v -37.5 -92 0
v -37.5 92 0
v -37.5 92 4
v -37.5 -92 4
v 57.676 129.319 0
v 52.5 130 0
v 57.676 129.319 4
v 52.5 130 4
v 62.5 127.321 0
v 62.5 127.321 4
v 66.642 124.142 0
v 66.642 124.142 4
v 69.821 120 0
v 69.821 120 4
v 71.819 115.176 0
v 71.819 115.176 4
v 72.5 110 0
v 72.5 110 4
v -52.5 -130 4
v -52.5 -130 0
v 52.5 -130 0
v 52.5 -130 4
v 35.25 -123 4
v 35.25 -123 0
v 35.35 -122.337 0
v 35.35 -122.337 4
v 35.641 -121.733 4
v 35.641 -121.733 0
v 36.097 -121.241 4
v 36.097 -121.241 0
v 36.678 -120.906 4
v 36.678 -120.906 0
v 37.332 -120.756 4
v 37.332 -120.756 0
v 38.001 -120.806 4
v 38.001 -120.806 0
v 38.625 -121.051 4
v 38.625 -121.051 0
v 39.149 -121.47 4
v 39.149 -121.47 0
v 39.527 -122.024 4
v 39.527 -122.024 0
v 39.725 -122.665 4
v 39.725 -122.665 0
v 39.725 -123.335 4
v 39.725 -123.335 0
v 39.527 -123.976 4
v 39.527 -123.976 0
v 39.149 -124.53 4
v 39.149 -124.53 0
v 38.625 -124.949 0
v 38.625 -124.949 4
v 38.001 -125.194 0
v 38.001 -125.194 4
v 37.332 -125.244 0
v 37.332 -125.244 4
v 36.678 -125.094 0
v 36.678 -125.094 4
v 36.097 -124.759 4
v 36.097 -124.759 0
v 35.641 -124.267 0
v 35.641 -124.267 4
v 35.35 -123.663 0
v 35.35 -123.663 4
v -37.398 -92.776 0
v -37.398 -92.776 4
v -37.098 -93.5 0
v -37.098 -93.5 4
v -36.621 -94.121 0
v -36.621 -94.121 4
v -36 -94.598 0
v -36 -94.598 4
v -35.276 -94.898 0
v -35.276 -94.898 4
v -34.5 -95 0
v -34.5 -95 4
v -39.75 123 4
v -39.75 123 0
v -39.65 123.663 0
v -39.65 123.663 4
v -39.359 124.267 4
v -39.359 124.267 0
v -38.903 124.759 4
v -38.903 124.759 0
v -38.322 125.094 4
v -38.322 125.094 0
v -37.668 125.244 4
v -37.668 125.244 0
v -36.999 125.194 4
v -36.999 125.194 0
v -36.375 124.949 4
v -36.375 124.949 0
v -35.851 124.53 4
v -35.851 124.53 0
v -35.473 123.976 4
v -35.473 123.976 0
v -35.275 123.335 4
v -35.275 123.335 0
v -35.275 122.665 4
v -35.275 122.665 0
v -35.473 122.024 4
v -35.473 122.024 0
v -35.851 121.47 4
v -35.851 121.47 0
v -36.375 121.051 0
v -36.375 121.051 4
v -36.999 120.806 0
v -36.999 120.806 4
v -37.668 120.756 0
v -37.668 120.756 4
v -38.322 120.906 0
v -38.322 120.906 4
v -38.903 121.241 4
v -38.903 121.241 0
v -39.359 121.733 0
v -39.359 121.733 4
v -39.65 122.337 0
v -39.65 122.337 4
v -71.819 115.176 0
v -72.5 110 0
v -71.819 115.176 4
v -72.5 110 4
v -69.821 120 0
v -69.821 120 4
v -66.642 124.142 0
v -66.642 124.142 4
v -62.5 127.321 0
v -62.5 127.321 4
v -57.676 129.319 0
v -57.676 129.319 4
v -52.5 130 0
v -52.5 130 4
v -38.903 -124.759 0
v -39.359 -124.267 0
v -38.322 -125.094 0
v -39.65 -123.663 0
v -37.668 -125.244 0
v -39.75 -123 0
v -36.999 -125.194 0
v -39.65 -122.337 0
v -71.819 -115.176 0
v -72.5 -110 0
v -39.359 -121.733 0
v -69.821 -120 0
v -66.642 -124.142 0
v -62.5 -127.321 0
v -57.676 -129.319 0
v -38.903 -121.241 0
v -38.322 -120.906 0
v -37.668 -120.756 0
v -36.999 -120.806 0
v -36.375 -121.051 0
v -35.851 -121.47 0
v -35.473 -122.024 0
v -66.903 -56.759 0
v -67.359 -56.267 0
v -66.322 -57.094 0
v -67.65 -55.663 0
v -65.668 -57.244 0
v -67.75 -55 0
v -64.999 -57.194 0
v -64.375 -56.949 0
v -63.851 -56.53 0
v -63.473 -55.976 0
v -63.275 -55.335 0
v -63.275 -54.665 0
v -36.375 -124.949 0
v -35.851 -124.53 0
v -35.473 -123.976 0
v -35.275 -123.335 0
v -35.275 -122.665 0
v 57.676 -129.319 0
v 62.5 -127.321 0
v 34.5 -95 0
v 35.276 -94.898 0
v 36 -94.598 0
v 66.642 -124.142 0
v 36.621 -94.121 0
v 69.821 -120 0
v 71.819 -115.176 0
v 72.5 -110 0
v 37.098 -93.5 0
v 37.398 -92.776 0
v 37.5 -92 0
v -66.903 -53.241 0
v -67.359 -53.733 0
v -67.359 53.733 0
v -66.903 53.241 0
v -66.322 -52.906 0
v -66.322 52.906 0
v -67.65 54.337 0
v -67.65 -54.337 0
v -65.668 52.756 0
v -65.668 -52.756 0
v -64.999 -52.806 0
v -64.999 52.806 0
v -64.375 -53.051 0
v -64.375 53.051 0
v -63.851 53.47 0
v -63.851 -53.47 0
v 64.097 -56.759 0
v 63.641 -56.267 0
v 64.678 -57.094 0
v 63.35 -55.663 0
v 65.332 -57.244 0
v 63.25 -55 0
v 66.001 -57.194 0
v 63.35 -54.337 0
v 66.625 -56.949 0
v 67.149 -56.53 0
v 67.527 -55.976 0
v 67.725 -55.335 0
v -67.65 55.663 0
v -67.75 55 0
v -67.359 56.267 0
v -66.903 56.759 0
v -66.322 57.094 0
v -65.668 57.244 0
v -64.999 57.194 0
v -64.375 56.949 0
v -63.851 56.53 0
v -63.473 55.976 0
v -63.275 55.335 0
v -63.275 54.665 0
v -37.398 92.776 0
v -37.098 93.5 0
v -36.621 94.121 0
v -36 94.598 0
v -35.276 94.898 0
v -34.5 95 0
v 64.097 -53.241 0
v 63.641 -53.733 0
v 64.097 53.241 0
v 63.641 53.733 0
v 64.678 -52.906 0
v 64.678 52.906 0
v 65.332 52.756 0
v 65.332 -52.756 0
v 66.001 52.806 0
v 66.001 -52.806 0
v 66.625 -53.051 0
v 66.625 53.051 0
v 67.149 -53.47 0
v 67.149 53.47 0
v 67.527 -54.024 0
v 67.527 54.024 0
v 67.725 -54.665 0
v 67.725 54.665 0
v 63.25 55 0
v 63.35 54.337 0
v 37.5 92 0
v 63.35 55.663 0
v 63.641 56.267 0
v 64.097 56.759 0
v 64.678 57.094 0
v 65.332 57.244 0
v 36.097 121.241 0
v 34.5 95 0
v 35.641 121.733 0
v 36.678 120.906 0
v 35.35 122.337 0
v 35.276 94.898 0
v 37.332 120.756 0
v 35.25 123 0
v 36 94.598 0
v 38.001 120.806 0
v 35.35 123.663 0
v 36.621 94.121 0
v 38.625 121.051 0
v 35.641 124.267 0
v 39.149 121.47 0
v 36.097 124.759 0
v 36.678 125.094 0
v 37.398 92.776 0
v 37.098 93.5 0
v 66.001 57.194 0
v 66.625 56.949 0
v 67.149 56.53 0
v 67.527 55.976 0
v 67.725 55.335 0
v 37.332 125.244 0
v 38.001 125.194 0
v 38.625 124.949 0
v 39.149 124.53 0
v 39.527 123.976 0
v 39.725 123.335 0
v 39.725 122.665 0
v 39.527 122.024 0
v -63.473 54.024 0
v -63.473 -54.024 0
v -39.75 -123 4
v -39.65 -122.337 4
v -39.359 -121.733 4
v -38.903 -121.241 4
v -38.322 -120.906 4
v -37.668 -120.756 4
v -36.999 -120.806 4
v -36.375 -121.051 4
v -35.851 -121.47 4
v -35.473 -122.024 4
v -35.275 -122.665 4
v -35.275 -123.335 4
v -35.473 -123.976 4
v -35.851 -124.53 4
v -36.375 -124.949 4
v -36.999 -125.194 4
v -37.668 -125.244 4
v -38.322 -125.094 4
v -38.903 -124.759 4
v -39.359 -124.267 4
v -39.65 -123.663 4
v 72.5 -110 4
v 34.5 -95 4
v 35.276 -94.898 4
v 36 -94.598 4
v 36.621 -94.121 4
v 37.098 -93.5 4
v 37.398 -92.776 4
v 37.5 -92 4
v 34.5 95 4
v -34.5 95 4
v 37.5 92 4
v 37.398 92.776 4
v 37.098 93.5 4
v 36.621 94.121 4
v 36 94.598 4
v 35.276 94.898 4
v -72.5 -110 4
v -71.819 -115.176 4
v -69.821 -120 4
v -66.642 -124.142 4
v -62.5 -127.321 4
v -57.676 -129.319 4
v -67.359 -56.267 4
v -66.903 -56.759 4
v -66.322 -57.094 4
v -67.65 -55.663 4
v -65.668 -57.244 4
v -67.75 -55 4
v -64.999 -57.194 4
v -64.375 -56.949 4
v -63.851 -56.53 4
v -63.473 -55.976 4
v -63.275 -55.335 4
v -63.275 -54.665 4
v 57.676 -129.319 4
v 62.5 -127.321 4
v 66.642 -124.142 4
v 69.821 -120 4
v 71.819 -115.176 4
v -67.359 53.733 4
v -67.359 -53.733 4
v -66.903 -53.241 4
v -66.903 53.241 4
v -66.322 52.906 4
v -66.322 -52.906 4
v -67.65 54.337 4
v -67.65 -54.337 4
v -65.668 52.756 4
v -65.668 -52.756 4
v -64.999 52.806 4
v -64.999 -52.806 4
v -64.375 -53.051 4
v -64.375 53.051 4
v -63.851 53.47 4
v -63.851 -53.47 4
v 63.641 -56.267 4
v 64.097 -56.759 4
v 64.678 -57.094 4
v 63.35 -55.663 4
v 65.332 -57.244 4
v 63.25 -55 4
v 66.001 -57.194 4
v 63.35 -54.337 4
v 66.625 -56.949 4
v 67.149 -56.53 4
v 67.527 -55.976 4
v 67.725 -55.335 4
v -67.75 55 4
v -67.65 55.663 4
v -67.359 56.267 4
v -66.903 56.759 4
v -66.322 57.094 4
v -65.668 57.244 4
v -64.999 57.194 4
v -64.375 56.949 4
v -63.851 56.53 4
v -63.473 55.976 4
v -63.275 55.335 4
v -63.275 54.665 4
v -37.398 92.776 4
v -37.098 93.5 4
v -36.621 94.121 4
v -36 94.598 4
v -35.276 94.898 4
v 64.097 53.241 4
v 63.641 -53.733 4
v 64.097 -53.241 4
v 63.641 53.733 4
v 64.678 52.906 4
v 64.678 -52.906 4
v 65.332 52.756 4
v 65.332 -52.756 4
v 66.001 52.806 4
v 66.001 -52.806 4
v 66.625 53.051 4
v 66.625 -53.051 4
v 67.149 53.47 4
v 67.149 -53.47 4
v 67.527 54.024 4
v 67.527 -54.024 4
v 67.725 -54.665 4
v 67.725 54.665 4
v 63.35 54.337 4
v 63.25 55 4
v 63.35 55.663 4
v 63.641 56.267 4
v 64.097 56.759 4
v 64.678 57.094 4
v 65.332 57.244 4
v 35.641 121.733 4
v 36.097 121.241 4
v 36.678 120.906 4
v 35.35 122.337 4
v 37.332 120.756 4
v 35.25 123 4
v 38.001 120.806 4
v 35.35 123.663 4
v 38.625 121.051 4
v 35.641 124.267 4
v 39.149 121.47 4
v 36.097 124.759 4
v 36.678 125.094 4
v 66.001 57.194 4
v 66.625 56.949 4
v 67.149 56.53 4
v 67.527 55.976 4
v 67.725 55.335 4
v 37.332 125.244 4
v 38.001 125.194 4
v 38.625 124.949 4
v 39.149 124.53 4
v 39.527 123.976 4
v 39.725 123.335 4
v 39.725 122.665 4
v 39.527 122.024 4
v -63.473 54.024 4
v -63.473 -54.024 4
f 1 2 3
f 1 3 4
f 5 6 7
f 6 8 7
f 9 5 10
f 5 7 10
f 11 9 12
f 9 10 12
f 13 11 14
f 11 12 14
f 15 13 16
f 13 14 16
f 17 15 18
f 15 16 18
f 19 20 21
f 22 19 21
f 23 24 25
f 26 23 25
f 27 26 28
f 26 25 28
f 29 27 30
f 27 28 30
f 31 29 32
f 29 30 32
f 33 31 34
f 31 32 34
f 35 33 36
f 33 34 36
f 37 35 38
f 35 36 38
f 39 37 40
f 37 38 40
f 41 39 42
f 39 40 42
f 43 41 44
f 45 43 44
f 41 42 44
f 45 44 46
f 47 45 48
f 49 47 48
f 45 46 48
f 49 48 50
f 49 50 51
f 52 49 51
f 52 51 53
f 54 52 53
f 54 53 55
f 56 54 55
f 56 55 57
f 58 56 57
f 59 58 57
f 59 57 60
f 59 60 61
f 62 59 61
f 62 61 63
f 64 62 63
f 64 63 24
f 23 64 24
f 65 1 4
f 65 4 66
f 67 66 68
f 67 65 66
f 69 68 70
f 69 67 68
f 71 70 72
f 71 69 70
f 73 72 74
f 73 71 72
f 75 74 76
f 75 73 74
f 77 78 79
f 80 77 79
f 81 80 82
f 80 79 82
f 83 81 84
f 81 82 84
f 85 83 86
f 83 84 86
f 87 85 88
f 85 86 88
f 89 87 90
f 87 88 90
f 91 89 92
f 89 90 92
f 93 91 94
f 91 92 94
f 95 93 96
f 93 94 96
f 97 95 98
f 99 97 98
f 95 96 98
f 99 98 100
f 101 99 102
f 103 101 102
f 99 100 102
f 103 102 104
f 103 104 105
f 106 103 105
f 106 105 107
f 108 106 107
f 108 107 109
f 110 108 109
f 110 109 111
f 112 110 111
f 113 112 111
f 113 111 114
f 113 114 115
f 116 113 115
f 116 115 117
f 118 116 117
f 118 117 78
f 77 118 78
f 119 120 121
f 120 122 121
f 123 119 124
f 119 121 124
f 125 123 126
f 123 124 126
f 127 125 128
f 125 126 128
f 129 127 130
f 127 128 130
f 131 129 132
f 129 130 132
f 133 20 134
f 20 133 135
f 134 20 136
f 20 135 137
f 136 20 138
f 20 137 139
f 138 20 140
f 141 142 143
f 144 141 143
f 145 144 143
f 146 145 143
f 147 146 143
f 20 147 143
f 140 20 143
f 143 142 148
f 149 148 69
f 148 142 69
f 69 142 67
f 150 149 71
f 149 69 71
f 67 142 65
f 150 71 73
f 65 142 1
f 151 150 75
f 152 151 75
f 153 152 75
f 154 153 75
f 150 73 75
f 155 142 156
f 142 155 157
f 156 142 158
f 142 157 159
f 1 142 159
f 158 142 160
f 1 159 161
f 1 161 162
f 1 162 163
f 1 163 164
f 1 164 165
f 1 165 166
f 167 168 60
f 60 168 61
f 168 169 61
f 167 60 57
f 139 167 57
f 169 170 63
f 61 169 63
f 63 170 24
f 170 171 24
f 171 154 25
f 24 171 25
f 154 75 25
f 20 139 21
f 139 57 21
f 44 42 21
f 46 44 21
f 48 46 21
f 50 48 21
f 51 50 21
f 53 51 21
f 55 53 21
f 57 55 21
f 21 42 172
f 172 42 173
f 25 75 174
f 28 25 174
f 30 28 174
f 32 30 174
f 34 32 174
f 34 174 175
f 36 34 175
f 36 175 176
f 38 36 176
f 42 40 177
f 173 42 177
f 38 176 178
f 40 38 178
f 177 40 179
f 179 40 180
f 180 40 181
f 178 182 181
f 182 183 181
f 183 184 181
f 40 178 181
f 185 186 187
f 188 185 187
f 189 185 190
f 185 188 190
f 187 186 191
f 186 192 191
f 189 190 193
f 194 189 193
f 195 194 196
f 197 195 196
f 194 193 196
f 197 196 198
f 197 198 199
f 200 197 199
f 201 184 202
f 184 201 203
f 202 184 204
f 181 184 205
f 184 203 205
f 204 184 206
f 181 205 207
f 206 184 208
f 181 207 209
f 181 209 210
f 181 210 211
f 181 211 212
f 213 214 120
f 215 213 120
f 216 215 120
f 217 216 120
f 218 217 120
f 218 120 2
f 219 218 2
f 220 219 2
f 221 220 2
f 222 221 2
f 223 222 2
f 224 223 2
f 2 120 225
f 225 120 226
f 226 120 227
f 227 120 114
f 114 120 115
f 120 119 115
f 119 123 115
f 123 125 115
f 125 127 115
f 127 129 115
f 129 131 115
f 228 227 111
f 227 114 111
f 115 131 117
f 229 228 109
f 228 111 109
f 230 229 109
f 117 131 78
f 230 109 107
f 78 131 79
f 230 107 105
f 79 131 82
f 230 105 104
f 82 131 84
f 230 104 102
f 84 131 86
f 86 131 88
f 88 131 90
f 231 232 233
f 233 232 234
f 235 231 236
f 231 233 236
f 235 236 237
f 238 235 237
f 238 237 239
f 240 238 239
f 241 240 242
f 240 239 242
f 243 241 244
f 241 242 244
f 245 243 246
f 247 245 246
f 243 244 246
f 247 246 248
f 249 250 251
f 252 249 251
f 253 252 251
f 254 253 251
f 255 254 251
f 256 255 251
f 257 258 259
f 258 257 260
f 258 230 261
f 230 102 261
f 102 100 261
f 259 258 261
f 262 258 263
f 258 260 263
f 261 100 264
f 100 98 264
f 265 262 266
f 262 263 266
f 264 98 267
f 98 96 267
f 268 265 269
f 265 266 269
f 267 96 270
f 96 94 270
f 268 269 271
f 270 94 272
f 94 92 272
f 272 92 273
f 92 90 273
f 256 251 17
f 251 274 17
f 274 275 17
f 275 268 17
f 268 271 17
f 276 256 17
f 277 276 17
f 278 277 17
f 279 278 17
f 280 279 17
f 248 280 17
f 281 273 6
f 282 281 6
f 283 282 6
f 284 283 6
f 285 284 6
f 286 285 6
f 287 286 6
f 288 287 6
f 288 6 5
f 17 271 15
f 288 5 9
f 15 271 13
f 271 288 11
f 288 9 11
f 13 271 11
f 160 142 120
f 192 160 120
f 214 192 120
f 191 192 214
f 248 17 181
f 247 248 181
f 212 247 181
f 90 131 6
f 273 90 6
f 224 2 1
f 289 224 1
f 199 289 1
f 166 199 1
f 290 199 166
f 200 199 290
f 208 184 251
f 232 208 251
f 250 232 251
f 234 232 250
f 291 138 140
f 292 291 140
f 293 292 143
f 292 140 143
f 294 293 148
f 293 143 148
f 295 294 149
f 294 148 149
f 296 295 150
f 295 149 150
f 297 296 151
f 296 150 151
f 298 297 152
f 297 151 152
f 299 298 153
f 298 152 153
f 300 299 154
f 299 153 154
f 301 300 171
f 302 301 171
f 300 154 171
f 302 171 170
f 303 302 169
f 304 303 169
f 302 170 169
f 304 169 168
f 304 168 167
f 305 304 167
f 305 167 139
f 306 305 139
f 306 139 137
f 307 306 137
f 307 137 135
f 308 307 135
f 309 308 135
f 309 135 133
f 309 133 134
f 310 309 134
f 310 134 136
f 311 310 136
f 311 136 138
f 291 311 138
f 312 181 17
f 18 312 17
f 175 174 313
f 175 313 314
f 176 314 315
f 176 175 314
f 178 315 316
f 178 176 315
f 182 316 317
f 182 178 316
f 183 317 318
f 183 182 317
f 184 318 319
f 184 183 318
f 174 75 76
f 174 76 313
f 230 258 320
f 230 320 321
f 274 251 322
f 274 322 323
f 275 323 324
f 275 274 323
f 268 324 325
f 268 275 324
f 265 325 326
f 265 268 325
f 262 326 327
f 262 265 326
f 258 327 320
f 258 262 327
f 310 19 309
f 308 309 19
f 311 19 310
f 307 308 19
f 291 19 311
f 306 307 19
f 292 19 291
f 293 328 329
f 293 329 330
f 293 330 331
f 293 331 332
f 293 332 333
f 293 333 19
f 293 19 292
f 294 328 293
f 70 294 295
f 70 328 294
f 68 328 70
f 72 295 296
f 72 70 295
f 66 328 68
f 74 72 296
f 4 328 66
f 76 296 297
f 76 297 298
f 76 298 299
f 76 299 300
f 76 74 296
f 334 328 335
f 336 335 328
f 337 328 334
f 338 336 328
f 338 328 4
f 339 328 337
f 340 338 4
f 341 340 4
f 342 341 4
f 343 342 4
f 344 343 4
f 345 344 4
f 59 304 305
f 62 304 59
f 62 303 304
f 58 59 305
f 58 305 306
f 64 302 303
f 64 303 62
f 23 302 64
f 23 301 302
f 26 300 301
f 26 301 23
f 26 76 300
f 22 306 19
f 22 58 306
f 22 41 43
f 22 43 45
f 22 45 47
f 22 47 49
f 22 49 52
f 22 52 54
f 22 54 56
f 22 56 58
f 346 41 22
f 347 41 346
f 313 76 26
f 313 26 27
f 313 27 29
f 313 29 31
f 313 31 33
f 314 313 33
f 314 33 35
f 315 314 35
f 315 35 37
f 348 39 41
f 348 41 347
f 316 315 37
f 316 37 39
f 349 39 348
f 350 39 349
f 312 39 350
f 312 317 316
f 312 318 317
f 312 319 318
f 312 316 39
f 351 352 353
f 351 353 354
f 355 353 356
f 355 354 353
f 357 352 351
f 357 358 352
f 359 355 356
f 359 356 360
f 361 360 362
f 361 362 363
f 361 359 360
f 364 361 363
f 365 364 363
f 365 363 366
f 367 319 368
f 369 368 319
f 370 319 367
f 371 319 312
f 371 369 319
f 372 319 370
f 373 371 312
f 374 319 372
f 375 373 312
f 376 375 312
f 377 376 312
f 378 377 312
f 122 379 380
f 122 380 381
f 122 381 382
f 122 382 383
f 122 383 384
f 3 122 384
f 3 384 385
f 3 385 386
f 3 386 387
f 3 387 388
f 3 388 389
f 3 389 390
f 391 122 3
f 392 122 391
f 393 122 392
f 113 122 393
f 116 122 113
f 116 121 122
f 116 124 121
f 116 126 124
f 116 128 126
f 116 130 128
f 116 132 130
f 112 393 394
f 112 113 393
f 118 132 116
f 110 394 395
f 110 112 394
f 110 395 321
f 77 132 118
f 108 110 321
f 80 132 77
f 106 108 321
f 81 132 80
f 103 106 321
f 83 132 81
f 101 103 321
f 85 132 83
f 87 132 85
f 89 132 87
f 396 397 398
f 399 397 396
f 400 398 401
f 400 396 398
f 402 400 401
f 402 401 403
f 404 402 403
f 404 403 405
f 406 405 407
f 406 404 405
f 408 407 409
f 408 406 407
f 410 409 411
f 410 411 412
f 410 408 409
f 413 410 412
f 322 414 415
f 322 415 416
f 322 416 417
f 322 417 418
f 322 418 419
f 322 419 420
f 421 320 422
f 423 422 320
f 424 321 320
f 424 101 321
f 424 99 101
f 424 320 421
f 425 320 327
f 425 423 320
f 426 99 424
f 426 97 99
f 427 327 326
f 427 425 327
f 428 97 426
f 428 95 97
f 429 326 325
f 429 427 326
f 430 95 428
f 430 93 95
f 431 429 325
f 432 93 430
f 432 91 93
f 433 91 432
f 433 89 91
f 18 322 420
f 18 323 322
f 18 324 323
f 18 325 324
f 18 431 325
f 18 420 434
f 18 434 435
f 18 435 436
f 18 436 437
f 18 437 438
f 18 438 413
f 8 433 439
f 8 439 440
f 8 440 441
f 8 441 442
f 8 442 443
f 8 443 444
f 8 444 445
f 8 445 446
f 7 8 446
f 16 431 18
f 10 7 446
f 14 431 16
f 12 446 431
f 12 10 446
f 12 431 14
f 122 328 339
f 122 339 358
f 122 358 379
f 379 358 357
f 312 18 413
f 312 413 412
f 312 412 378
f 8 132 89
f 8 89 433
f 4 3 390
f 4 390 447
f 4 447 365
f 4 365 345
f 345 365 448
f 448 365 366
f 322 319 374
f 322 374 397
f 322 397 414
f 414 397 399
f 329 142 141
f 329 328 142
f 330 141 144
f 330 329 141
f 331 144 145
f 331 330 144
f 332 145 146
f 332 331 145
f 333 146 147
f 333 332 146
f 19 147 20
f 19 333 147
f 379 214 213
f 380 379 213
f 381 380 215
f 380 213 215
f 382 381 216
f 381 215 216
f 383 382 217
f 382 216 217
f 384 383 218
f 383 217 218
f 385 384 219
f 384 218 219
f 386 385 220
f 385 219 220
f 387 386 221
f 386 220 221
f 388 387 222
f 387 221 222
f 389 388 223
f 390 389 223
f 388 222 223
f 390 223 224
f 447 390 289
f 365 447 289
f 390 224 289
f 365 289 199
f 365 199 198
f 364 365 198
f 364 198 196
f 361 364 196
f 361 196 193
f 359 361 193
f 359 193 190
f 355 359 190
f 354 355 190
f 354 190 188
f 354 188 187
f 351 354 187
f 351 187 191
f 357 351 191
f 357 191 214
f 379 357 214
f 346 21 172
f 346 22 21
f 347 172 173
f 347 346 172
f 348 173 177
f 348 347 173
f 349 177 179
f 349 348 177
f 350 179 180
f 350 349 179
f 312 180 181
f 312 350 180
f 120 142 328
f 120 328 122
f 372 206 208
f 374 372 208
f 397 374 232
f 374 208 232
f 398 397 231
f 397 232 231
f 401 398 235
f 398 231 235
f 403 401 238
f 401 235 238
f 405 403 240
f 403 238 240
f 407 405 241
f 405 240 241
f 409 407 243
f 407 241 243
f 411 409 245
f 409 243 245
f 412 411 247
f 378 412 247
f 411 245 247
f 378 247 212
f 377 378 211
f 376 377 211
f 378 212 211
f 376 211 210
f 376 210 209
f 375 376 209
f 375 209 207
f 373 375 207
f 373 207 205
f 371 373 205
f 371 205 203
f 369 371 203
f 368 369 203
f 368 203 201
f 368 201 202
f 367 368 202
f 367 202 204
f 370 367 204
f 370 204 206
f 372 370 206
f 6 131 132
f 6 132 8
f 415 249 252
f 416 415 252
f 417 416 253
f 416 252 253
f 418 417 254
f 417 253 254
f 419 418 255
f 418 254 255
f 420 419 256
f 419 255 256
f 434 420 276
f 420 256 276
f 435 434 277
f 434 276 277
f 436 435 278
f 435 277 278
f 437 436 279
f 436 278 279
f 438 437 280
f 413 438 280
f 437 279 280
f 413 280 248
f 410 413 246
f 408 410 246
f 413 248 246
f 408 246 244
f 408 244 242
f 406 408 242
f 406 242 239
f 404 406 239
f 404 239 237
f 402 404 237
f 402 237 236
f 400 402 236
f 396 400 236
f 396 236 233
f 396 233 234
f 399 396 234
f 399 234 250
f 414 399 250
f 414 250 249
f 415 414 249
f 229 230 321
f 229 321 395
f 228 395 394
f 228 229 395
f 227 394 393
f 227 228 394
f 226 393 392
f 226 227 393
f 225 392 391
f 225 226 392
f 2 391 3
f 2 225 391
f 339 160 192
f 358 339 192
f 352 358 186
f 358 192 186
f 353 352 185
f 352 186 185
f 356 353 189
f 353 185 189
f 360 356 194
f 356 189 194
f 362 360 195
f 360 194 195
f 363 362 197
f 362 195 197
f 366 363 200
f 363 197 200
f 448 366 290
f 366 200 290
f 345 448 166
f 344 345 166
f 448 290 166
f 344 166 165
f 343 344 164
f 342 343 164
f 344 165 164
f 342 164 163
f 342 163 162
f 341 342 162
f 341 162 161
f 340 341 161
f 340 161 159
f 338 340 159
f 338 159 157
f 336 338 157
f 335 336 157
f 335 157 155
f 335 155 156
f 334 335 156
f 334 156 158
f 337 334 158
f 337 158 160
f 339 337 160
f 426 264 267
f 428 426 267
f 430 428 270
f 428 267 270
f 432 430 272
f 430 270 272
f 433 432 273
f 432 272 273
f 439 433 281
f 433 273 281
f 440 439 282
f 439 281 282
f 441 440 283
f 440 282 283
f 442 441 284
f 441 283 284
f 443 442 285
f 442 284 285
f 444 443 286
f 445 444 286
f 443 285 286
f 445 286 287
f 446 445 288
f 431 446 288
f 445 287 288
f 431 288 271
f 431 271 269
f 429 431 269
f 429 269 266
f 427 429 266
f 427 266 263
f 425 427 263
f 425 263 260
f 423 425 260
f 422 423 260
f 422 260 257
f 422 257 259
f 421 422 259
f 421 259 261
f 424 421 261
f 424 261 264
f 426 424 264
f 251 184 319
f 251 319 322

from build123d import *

# Parameters (mm, degrees)
ESBO_O1_W                = 145
ESBO_O1_H                = 260
RESSALTO_EXTRUS_O1_DEPTH = 4
FURO_COM_FOLGA_DE_M41_D  = 4.5
FILETE1_R                = 20


with BuildPart() as part:
    # Esboço1 → Ressalto-extrusão1 (new body)
    with BuildSketch(Plane.XY):
        Rectangle(ESBO_O1_W, ESBO_O1_H)
        with BuildLine():
            Line((-34.5, -95), (34.5, -95))
            ThreePointArc((34.5, -95), (36.621320344, -94.121320344), (37.5, -92))
            Line((37.5, -92), (37.5, 92))
            ThreePointArc((37.5, 92), (36.621320344, 94.121320344), (34.5, 95))
            Line((34.5, 95), (-34.5, 95))
            ThreePointArc((-34.5, 95), (-36.621320344, 94.121320344), (-37.5, 92))
            Line((-37.5, 92), (-37.5, -92))
            ThreePointArc((-37.5, -92), (-36.621320344, -94.121320344), (-34.5, -95))
        make_face(mode=Mode.SUBTRACT)
    extrude(amount=RESSALTO_EXTRUS_O1_DEPTH)

    # Furo com folga de M41 (through all)
    with Locations(Plane.XY.offset(4)):
        with Locations((-37.5, 123), (37.5, 123), (65.5, 55), (65.5, -55), (37.5, -123), (-37.5, -123), (-65.5, -55), (-65.5, 55)):
            Hole(FURO_COM_FOLGA_DE_M41_D / 2)

    # Filete1
    filete1_edges = [part.edges().sort_by_distance(p)[0] for p in [
        (72.5, -130, 2),
        (-72.5, -130, 2),
        (-72.5, 130, 2),
        (72.5, 130, 2),
    ]]
    fillet(filete1_edges, radius=FILETE1_R)


solid = part.part
